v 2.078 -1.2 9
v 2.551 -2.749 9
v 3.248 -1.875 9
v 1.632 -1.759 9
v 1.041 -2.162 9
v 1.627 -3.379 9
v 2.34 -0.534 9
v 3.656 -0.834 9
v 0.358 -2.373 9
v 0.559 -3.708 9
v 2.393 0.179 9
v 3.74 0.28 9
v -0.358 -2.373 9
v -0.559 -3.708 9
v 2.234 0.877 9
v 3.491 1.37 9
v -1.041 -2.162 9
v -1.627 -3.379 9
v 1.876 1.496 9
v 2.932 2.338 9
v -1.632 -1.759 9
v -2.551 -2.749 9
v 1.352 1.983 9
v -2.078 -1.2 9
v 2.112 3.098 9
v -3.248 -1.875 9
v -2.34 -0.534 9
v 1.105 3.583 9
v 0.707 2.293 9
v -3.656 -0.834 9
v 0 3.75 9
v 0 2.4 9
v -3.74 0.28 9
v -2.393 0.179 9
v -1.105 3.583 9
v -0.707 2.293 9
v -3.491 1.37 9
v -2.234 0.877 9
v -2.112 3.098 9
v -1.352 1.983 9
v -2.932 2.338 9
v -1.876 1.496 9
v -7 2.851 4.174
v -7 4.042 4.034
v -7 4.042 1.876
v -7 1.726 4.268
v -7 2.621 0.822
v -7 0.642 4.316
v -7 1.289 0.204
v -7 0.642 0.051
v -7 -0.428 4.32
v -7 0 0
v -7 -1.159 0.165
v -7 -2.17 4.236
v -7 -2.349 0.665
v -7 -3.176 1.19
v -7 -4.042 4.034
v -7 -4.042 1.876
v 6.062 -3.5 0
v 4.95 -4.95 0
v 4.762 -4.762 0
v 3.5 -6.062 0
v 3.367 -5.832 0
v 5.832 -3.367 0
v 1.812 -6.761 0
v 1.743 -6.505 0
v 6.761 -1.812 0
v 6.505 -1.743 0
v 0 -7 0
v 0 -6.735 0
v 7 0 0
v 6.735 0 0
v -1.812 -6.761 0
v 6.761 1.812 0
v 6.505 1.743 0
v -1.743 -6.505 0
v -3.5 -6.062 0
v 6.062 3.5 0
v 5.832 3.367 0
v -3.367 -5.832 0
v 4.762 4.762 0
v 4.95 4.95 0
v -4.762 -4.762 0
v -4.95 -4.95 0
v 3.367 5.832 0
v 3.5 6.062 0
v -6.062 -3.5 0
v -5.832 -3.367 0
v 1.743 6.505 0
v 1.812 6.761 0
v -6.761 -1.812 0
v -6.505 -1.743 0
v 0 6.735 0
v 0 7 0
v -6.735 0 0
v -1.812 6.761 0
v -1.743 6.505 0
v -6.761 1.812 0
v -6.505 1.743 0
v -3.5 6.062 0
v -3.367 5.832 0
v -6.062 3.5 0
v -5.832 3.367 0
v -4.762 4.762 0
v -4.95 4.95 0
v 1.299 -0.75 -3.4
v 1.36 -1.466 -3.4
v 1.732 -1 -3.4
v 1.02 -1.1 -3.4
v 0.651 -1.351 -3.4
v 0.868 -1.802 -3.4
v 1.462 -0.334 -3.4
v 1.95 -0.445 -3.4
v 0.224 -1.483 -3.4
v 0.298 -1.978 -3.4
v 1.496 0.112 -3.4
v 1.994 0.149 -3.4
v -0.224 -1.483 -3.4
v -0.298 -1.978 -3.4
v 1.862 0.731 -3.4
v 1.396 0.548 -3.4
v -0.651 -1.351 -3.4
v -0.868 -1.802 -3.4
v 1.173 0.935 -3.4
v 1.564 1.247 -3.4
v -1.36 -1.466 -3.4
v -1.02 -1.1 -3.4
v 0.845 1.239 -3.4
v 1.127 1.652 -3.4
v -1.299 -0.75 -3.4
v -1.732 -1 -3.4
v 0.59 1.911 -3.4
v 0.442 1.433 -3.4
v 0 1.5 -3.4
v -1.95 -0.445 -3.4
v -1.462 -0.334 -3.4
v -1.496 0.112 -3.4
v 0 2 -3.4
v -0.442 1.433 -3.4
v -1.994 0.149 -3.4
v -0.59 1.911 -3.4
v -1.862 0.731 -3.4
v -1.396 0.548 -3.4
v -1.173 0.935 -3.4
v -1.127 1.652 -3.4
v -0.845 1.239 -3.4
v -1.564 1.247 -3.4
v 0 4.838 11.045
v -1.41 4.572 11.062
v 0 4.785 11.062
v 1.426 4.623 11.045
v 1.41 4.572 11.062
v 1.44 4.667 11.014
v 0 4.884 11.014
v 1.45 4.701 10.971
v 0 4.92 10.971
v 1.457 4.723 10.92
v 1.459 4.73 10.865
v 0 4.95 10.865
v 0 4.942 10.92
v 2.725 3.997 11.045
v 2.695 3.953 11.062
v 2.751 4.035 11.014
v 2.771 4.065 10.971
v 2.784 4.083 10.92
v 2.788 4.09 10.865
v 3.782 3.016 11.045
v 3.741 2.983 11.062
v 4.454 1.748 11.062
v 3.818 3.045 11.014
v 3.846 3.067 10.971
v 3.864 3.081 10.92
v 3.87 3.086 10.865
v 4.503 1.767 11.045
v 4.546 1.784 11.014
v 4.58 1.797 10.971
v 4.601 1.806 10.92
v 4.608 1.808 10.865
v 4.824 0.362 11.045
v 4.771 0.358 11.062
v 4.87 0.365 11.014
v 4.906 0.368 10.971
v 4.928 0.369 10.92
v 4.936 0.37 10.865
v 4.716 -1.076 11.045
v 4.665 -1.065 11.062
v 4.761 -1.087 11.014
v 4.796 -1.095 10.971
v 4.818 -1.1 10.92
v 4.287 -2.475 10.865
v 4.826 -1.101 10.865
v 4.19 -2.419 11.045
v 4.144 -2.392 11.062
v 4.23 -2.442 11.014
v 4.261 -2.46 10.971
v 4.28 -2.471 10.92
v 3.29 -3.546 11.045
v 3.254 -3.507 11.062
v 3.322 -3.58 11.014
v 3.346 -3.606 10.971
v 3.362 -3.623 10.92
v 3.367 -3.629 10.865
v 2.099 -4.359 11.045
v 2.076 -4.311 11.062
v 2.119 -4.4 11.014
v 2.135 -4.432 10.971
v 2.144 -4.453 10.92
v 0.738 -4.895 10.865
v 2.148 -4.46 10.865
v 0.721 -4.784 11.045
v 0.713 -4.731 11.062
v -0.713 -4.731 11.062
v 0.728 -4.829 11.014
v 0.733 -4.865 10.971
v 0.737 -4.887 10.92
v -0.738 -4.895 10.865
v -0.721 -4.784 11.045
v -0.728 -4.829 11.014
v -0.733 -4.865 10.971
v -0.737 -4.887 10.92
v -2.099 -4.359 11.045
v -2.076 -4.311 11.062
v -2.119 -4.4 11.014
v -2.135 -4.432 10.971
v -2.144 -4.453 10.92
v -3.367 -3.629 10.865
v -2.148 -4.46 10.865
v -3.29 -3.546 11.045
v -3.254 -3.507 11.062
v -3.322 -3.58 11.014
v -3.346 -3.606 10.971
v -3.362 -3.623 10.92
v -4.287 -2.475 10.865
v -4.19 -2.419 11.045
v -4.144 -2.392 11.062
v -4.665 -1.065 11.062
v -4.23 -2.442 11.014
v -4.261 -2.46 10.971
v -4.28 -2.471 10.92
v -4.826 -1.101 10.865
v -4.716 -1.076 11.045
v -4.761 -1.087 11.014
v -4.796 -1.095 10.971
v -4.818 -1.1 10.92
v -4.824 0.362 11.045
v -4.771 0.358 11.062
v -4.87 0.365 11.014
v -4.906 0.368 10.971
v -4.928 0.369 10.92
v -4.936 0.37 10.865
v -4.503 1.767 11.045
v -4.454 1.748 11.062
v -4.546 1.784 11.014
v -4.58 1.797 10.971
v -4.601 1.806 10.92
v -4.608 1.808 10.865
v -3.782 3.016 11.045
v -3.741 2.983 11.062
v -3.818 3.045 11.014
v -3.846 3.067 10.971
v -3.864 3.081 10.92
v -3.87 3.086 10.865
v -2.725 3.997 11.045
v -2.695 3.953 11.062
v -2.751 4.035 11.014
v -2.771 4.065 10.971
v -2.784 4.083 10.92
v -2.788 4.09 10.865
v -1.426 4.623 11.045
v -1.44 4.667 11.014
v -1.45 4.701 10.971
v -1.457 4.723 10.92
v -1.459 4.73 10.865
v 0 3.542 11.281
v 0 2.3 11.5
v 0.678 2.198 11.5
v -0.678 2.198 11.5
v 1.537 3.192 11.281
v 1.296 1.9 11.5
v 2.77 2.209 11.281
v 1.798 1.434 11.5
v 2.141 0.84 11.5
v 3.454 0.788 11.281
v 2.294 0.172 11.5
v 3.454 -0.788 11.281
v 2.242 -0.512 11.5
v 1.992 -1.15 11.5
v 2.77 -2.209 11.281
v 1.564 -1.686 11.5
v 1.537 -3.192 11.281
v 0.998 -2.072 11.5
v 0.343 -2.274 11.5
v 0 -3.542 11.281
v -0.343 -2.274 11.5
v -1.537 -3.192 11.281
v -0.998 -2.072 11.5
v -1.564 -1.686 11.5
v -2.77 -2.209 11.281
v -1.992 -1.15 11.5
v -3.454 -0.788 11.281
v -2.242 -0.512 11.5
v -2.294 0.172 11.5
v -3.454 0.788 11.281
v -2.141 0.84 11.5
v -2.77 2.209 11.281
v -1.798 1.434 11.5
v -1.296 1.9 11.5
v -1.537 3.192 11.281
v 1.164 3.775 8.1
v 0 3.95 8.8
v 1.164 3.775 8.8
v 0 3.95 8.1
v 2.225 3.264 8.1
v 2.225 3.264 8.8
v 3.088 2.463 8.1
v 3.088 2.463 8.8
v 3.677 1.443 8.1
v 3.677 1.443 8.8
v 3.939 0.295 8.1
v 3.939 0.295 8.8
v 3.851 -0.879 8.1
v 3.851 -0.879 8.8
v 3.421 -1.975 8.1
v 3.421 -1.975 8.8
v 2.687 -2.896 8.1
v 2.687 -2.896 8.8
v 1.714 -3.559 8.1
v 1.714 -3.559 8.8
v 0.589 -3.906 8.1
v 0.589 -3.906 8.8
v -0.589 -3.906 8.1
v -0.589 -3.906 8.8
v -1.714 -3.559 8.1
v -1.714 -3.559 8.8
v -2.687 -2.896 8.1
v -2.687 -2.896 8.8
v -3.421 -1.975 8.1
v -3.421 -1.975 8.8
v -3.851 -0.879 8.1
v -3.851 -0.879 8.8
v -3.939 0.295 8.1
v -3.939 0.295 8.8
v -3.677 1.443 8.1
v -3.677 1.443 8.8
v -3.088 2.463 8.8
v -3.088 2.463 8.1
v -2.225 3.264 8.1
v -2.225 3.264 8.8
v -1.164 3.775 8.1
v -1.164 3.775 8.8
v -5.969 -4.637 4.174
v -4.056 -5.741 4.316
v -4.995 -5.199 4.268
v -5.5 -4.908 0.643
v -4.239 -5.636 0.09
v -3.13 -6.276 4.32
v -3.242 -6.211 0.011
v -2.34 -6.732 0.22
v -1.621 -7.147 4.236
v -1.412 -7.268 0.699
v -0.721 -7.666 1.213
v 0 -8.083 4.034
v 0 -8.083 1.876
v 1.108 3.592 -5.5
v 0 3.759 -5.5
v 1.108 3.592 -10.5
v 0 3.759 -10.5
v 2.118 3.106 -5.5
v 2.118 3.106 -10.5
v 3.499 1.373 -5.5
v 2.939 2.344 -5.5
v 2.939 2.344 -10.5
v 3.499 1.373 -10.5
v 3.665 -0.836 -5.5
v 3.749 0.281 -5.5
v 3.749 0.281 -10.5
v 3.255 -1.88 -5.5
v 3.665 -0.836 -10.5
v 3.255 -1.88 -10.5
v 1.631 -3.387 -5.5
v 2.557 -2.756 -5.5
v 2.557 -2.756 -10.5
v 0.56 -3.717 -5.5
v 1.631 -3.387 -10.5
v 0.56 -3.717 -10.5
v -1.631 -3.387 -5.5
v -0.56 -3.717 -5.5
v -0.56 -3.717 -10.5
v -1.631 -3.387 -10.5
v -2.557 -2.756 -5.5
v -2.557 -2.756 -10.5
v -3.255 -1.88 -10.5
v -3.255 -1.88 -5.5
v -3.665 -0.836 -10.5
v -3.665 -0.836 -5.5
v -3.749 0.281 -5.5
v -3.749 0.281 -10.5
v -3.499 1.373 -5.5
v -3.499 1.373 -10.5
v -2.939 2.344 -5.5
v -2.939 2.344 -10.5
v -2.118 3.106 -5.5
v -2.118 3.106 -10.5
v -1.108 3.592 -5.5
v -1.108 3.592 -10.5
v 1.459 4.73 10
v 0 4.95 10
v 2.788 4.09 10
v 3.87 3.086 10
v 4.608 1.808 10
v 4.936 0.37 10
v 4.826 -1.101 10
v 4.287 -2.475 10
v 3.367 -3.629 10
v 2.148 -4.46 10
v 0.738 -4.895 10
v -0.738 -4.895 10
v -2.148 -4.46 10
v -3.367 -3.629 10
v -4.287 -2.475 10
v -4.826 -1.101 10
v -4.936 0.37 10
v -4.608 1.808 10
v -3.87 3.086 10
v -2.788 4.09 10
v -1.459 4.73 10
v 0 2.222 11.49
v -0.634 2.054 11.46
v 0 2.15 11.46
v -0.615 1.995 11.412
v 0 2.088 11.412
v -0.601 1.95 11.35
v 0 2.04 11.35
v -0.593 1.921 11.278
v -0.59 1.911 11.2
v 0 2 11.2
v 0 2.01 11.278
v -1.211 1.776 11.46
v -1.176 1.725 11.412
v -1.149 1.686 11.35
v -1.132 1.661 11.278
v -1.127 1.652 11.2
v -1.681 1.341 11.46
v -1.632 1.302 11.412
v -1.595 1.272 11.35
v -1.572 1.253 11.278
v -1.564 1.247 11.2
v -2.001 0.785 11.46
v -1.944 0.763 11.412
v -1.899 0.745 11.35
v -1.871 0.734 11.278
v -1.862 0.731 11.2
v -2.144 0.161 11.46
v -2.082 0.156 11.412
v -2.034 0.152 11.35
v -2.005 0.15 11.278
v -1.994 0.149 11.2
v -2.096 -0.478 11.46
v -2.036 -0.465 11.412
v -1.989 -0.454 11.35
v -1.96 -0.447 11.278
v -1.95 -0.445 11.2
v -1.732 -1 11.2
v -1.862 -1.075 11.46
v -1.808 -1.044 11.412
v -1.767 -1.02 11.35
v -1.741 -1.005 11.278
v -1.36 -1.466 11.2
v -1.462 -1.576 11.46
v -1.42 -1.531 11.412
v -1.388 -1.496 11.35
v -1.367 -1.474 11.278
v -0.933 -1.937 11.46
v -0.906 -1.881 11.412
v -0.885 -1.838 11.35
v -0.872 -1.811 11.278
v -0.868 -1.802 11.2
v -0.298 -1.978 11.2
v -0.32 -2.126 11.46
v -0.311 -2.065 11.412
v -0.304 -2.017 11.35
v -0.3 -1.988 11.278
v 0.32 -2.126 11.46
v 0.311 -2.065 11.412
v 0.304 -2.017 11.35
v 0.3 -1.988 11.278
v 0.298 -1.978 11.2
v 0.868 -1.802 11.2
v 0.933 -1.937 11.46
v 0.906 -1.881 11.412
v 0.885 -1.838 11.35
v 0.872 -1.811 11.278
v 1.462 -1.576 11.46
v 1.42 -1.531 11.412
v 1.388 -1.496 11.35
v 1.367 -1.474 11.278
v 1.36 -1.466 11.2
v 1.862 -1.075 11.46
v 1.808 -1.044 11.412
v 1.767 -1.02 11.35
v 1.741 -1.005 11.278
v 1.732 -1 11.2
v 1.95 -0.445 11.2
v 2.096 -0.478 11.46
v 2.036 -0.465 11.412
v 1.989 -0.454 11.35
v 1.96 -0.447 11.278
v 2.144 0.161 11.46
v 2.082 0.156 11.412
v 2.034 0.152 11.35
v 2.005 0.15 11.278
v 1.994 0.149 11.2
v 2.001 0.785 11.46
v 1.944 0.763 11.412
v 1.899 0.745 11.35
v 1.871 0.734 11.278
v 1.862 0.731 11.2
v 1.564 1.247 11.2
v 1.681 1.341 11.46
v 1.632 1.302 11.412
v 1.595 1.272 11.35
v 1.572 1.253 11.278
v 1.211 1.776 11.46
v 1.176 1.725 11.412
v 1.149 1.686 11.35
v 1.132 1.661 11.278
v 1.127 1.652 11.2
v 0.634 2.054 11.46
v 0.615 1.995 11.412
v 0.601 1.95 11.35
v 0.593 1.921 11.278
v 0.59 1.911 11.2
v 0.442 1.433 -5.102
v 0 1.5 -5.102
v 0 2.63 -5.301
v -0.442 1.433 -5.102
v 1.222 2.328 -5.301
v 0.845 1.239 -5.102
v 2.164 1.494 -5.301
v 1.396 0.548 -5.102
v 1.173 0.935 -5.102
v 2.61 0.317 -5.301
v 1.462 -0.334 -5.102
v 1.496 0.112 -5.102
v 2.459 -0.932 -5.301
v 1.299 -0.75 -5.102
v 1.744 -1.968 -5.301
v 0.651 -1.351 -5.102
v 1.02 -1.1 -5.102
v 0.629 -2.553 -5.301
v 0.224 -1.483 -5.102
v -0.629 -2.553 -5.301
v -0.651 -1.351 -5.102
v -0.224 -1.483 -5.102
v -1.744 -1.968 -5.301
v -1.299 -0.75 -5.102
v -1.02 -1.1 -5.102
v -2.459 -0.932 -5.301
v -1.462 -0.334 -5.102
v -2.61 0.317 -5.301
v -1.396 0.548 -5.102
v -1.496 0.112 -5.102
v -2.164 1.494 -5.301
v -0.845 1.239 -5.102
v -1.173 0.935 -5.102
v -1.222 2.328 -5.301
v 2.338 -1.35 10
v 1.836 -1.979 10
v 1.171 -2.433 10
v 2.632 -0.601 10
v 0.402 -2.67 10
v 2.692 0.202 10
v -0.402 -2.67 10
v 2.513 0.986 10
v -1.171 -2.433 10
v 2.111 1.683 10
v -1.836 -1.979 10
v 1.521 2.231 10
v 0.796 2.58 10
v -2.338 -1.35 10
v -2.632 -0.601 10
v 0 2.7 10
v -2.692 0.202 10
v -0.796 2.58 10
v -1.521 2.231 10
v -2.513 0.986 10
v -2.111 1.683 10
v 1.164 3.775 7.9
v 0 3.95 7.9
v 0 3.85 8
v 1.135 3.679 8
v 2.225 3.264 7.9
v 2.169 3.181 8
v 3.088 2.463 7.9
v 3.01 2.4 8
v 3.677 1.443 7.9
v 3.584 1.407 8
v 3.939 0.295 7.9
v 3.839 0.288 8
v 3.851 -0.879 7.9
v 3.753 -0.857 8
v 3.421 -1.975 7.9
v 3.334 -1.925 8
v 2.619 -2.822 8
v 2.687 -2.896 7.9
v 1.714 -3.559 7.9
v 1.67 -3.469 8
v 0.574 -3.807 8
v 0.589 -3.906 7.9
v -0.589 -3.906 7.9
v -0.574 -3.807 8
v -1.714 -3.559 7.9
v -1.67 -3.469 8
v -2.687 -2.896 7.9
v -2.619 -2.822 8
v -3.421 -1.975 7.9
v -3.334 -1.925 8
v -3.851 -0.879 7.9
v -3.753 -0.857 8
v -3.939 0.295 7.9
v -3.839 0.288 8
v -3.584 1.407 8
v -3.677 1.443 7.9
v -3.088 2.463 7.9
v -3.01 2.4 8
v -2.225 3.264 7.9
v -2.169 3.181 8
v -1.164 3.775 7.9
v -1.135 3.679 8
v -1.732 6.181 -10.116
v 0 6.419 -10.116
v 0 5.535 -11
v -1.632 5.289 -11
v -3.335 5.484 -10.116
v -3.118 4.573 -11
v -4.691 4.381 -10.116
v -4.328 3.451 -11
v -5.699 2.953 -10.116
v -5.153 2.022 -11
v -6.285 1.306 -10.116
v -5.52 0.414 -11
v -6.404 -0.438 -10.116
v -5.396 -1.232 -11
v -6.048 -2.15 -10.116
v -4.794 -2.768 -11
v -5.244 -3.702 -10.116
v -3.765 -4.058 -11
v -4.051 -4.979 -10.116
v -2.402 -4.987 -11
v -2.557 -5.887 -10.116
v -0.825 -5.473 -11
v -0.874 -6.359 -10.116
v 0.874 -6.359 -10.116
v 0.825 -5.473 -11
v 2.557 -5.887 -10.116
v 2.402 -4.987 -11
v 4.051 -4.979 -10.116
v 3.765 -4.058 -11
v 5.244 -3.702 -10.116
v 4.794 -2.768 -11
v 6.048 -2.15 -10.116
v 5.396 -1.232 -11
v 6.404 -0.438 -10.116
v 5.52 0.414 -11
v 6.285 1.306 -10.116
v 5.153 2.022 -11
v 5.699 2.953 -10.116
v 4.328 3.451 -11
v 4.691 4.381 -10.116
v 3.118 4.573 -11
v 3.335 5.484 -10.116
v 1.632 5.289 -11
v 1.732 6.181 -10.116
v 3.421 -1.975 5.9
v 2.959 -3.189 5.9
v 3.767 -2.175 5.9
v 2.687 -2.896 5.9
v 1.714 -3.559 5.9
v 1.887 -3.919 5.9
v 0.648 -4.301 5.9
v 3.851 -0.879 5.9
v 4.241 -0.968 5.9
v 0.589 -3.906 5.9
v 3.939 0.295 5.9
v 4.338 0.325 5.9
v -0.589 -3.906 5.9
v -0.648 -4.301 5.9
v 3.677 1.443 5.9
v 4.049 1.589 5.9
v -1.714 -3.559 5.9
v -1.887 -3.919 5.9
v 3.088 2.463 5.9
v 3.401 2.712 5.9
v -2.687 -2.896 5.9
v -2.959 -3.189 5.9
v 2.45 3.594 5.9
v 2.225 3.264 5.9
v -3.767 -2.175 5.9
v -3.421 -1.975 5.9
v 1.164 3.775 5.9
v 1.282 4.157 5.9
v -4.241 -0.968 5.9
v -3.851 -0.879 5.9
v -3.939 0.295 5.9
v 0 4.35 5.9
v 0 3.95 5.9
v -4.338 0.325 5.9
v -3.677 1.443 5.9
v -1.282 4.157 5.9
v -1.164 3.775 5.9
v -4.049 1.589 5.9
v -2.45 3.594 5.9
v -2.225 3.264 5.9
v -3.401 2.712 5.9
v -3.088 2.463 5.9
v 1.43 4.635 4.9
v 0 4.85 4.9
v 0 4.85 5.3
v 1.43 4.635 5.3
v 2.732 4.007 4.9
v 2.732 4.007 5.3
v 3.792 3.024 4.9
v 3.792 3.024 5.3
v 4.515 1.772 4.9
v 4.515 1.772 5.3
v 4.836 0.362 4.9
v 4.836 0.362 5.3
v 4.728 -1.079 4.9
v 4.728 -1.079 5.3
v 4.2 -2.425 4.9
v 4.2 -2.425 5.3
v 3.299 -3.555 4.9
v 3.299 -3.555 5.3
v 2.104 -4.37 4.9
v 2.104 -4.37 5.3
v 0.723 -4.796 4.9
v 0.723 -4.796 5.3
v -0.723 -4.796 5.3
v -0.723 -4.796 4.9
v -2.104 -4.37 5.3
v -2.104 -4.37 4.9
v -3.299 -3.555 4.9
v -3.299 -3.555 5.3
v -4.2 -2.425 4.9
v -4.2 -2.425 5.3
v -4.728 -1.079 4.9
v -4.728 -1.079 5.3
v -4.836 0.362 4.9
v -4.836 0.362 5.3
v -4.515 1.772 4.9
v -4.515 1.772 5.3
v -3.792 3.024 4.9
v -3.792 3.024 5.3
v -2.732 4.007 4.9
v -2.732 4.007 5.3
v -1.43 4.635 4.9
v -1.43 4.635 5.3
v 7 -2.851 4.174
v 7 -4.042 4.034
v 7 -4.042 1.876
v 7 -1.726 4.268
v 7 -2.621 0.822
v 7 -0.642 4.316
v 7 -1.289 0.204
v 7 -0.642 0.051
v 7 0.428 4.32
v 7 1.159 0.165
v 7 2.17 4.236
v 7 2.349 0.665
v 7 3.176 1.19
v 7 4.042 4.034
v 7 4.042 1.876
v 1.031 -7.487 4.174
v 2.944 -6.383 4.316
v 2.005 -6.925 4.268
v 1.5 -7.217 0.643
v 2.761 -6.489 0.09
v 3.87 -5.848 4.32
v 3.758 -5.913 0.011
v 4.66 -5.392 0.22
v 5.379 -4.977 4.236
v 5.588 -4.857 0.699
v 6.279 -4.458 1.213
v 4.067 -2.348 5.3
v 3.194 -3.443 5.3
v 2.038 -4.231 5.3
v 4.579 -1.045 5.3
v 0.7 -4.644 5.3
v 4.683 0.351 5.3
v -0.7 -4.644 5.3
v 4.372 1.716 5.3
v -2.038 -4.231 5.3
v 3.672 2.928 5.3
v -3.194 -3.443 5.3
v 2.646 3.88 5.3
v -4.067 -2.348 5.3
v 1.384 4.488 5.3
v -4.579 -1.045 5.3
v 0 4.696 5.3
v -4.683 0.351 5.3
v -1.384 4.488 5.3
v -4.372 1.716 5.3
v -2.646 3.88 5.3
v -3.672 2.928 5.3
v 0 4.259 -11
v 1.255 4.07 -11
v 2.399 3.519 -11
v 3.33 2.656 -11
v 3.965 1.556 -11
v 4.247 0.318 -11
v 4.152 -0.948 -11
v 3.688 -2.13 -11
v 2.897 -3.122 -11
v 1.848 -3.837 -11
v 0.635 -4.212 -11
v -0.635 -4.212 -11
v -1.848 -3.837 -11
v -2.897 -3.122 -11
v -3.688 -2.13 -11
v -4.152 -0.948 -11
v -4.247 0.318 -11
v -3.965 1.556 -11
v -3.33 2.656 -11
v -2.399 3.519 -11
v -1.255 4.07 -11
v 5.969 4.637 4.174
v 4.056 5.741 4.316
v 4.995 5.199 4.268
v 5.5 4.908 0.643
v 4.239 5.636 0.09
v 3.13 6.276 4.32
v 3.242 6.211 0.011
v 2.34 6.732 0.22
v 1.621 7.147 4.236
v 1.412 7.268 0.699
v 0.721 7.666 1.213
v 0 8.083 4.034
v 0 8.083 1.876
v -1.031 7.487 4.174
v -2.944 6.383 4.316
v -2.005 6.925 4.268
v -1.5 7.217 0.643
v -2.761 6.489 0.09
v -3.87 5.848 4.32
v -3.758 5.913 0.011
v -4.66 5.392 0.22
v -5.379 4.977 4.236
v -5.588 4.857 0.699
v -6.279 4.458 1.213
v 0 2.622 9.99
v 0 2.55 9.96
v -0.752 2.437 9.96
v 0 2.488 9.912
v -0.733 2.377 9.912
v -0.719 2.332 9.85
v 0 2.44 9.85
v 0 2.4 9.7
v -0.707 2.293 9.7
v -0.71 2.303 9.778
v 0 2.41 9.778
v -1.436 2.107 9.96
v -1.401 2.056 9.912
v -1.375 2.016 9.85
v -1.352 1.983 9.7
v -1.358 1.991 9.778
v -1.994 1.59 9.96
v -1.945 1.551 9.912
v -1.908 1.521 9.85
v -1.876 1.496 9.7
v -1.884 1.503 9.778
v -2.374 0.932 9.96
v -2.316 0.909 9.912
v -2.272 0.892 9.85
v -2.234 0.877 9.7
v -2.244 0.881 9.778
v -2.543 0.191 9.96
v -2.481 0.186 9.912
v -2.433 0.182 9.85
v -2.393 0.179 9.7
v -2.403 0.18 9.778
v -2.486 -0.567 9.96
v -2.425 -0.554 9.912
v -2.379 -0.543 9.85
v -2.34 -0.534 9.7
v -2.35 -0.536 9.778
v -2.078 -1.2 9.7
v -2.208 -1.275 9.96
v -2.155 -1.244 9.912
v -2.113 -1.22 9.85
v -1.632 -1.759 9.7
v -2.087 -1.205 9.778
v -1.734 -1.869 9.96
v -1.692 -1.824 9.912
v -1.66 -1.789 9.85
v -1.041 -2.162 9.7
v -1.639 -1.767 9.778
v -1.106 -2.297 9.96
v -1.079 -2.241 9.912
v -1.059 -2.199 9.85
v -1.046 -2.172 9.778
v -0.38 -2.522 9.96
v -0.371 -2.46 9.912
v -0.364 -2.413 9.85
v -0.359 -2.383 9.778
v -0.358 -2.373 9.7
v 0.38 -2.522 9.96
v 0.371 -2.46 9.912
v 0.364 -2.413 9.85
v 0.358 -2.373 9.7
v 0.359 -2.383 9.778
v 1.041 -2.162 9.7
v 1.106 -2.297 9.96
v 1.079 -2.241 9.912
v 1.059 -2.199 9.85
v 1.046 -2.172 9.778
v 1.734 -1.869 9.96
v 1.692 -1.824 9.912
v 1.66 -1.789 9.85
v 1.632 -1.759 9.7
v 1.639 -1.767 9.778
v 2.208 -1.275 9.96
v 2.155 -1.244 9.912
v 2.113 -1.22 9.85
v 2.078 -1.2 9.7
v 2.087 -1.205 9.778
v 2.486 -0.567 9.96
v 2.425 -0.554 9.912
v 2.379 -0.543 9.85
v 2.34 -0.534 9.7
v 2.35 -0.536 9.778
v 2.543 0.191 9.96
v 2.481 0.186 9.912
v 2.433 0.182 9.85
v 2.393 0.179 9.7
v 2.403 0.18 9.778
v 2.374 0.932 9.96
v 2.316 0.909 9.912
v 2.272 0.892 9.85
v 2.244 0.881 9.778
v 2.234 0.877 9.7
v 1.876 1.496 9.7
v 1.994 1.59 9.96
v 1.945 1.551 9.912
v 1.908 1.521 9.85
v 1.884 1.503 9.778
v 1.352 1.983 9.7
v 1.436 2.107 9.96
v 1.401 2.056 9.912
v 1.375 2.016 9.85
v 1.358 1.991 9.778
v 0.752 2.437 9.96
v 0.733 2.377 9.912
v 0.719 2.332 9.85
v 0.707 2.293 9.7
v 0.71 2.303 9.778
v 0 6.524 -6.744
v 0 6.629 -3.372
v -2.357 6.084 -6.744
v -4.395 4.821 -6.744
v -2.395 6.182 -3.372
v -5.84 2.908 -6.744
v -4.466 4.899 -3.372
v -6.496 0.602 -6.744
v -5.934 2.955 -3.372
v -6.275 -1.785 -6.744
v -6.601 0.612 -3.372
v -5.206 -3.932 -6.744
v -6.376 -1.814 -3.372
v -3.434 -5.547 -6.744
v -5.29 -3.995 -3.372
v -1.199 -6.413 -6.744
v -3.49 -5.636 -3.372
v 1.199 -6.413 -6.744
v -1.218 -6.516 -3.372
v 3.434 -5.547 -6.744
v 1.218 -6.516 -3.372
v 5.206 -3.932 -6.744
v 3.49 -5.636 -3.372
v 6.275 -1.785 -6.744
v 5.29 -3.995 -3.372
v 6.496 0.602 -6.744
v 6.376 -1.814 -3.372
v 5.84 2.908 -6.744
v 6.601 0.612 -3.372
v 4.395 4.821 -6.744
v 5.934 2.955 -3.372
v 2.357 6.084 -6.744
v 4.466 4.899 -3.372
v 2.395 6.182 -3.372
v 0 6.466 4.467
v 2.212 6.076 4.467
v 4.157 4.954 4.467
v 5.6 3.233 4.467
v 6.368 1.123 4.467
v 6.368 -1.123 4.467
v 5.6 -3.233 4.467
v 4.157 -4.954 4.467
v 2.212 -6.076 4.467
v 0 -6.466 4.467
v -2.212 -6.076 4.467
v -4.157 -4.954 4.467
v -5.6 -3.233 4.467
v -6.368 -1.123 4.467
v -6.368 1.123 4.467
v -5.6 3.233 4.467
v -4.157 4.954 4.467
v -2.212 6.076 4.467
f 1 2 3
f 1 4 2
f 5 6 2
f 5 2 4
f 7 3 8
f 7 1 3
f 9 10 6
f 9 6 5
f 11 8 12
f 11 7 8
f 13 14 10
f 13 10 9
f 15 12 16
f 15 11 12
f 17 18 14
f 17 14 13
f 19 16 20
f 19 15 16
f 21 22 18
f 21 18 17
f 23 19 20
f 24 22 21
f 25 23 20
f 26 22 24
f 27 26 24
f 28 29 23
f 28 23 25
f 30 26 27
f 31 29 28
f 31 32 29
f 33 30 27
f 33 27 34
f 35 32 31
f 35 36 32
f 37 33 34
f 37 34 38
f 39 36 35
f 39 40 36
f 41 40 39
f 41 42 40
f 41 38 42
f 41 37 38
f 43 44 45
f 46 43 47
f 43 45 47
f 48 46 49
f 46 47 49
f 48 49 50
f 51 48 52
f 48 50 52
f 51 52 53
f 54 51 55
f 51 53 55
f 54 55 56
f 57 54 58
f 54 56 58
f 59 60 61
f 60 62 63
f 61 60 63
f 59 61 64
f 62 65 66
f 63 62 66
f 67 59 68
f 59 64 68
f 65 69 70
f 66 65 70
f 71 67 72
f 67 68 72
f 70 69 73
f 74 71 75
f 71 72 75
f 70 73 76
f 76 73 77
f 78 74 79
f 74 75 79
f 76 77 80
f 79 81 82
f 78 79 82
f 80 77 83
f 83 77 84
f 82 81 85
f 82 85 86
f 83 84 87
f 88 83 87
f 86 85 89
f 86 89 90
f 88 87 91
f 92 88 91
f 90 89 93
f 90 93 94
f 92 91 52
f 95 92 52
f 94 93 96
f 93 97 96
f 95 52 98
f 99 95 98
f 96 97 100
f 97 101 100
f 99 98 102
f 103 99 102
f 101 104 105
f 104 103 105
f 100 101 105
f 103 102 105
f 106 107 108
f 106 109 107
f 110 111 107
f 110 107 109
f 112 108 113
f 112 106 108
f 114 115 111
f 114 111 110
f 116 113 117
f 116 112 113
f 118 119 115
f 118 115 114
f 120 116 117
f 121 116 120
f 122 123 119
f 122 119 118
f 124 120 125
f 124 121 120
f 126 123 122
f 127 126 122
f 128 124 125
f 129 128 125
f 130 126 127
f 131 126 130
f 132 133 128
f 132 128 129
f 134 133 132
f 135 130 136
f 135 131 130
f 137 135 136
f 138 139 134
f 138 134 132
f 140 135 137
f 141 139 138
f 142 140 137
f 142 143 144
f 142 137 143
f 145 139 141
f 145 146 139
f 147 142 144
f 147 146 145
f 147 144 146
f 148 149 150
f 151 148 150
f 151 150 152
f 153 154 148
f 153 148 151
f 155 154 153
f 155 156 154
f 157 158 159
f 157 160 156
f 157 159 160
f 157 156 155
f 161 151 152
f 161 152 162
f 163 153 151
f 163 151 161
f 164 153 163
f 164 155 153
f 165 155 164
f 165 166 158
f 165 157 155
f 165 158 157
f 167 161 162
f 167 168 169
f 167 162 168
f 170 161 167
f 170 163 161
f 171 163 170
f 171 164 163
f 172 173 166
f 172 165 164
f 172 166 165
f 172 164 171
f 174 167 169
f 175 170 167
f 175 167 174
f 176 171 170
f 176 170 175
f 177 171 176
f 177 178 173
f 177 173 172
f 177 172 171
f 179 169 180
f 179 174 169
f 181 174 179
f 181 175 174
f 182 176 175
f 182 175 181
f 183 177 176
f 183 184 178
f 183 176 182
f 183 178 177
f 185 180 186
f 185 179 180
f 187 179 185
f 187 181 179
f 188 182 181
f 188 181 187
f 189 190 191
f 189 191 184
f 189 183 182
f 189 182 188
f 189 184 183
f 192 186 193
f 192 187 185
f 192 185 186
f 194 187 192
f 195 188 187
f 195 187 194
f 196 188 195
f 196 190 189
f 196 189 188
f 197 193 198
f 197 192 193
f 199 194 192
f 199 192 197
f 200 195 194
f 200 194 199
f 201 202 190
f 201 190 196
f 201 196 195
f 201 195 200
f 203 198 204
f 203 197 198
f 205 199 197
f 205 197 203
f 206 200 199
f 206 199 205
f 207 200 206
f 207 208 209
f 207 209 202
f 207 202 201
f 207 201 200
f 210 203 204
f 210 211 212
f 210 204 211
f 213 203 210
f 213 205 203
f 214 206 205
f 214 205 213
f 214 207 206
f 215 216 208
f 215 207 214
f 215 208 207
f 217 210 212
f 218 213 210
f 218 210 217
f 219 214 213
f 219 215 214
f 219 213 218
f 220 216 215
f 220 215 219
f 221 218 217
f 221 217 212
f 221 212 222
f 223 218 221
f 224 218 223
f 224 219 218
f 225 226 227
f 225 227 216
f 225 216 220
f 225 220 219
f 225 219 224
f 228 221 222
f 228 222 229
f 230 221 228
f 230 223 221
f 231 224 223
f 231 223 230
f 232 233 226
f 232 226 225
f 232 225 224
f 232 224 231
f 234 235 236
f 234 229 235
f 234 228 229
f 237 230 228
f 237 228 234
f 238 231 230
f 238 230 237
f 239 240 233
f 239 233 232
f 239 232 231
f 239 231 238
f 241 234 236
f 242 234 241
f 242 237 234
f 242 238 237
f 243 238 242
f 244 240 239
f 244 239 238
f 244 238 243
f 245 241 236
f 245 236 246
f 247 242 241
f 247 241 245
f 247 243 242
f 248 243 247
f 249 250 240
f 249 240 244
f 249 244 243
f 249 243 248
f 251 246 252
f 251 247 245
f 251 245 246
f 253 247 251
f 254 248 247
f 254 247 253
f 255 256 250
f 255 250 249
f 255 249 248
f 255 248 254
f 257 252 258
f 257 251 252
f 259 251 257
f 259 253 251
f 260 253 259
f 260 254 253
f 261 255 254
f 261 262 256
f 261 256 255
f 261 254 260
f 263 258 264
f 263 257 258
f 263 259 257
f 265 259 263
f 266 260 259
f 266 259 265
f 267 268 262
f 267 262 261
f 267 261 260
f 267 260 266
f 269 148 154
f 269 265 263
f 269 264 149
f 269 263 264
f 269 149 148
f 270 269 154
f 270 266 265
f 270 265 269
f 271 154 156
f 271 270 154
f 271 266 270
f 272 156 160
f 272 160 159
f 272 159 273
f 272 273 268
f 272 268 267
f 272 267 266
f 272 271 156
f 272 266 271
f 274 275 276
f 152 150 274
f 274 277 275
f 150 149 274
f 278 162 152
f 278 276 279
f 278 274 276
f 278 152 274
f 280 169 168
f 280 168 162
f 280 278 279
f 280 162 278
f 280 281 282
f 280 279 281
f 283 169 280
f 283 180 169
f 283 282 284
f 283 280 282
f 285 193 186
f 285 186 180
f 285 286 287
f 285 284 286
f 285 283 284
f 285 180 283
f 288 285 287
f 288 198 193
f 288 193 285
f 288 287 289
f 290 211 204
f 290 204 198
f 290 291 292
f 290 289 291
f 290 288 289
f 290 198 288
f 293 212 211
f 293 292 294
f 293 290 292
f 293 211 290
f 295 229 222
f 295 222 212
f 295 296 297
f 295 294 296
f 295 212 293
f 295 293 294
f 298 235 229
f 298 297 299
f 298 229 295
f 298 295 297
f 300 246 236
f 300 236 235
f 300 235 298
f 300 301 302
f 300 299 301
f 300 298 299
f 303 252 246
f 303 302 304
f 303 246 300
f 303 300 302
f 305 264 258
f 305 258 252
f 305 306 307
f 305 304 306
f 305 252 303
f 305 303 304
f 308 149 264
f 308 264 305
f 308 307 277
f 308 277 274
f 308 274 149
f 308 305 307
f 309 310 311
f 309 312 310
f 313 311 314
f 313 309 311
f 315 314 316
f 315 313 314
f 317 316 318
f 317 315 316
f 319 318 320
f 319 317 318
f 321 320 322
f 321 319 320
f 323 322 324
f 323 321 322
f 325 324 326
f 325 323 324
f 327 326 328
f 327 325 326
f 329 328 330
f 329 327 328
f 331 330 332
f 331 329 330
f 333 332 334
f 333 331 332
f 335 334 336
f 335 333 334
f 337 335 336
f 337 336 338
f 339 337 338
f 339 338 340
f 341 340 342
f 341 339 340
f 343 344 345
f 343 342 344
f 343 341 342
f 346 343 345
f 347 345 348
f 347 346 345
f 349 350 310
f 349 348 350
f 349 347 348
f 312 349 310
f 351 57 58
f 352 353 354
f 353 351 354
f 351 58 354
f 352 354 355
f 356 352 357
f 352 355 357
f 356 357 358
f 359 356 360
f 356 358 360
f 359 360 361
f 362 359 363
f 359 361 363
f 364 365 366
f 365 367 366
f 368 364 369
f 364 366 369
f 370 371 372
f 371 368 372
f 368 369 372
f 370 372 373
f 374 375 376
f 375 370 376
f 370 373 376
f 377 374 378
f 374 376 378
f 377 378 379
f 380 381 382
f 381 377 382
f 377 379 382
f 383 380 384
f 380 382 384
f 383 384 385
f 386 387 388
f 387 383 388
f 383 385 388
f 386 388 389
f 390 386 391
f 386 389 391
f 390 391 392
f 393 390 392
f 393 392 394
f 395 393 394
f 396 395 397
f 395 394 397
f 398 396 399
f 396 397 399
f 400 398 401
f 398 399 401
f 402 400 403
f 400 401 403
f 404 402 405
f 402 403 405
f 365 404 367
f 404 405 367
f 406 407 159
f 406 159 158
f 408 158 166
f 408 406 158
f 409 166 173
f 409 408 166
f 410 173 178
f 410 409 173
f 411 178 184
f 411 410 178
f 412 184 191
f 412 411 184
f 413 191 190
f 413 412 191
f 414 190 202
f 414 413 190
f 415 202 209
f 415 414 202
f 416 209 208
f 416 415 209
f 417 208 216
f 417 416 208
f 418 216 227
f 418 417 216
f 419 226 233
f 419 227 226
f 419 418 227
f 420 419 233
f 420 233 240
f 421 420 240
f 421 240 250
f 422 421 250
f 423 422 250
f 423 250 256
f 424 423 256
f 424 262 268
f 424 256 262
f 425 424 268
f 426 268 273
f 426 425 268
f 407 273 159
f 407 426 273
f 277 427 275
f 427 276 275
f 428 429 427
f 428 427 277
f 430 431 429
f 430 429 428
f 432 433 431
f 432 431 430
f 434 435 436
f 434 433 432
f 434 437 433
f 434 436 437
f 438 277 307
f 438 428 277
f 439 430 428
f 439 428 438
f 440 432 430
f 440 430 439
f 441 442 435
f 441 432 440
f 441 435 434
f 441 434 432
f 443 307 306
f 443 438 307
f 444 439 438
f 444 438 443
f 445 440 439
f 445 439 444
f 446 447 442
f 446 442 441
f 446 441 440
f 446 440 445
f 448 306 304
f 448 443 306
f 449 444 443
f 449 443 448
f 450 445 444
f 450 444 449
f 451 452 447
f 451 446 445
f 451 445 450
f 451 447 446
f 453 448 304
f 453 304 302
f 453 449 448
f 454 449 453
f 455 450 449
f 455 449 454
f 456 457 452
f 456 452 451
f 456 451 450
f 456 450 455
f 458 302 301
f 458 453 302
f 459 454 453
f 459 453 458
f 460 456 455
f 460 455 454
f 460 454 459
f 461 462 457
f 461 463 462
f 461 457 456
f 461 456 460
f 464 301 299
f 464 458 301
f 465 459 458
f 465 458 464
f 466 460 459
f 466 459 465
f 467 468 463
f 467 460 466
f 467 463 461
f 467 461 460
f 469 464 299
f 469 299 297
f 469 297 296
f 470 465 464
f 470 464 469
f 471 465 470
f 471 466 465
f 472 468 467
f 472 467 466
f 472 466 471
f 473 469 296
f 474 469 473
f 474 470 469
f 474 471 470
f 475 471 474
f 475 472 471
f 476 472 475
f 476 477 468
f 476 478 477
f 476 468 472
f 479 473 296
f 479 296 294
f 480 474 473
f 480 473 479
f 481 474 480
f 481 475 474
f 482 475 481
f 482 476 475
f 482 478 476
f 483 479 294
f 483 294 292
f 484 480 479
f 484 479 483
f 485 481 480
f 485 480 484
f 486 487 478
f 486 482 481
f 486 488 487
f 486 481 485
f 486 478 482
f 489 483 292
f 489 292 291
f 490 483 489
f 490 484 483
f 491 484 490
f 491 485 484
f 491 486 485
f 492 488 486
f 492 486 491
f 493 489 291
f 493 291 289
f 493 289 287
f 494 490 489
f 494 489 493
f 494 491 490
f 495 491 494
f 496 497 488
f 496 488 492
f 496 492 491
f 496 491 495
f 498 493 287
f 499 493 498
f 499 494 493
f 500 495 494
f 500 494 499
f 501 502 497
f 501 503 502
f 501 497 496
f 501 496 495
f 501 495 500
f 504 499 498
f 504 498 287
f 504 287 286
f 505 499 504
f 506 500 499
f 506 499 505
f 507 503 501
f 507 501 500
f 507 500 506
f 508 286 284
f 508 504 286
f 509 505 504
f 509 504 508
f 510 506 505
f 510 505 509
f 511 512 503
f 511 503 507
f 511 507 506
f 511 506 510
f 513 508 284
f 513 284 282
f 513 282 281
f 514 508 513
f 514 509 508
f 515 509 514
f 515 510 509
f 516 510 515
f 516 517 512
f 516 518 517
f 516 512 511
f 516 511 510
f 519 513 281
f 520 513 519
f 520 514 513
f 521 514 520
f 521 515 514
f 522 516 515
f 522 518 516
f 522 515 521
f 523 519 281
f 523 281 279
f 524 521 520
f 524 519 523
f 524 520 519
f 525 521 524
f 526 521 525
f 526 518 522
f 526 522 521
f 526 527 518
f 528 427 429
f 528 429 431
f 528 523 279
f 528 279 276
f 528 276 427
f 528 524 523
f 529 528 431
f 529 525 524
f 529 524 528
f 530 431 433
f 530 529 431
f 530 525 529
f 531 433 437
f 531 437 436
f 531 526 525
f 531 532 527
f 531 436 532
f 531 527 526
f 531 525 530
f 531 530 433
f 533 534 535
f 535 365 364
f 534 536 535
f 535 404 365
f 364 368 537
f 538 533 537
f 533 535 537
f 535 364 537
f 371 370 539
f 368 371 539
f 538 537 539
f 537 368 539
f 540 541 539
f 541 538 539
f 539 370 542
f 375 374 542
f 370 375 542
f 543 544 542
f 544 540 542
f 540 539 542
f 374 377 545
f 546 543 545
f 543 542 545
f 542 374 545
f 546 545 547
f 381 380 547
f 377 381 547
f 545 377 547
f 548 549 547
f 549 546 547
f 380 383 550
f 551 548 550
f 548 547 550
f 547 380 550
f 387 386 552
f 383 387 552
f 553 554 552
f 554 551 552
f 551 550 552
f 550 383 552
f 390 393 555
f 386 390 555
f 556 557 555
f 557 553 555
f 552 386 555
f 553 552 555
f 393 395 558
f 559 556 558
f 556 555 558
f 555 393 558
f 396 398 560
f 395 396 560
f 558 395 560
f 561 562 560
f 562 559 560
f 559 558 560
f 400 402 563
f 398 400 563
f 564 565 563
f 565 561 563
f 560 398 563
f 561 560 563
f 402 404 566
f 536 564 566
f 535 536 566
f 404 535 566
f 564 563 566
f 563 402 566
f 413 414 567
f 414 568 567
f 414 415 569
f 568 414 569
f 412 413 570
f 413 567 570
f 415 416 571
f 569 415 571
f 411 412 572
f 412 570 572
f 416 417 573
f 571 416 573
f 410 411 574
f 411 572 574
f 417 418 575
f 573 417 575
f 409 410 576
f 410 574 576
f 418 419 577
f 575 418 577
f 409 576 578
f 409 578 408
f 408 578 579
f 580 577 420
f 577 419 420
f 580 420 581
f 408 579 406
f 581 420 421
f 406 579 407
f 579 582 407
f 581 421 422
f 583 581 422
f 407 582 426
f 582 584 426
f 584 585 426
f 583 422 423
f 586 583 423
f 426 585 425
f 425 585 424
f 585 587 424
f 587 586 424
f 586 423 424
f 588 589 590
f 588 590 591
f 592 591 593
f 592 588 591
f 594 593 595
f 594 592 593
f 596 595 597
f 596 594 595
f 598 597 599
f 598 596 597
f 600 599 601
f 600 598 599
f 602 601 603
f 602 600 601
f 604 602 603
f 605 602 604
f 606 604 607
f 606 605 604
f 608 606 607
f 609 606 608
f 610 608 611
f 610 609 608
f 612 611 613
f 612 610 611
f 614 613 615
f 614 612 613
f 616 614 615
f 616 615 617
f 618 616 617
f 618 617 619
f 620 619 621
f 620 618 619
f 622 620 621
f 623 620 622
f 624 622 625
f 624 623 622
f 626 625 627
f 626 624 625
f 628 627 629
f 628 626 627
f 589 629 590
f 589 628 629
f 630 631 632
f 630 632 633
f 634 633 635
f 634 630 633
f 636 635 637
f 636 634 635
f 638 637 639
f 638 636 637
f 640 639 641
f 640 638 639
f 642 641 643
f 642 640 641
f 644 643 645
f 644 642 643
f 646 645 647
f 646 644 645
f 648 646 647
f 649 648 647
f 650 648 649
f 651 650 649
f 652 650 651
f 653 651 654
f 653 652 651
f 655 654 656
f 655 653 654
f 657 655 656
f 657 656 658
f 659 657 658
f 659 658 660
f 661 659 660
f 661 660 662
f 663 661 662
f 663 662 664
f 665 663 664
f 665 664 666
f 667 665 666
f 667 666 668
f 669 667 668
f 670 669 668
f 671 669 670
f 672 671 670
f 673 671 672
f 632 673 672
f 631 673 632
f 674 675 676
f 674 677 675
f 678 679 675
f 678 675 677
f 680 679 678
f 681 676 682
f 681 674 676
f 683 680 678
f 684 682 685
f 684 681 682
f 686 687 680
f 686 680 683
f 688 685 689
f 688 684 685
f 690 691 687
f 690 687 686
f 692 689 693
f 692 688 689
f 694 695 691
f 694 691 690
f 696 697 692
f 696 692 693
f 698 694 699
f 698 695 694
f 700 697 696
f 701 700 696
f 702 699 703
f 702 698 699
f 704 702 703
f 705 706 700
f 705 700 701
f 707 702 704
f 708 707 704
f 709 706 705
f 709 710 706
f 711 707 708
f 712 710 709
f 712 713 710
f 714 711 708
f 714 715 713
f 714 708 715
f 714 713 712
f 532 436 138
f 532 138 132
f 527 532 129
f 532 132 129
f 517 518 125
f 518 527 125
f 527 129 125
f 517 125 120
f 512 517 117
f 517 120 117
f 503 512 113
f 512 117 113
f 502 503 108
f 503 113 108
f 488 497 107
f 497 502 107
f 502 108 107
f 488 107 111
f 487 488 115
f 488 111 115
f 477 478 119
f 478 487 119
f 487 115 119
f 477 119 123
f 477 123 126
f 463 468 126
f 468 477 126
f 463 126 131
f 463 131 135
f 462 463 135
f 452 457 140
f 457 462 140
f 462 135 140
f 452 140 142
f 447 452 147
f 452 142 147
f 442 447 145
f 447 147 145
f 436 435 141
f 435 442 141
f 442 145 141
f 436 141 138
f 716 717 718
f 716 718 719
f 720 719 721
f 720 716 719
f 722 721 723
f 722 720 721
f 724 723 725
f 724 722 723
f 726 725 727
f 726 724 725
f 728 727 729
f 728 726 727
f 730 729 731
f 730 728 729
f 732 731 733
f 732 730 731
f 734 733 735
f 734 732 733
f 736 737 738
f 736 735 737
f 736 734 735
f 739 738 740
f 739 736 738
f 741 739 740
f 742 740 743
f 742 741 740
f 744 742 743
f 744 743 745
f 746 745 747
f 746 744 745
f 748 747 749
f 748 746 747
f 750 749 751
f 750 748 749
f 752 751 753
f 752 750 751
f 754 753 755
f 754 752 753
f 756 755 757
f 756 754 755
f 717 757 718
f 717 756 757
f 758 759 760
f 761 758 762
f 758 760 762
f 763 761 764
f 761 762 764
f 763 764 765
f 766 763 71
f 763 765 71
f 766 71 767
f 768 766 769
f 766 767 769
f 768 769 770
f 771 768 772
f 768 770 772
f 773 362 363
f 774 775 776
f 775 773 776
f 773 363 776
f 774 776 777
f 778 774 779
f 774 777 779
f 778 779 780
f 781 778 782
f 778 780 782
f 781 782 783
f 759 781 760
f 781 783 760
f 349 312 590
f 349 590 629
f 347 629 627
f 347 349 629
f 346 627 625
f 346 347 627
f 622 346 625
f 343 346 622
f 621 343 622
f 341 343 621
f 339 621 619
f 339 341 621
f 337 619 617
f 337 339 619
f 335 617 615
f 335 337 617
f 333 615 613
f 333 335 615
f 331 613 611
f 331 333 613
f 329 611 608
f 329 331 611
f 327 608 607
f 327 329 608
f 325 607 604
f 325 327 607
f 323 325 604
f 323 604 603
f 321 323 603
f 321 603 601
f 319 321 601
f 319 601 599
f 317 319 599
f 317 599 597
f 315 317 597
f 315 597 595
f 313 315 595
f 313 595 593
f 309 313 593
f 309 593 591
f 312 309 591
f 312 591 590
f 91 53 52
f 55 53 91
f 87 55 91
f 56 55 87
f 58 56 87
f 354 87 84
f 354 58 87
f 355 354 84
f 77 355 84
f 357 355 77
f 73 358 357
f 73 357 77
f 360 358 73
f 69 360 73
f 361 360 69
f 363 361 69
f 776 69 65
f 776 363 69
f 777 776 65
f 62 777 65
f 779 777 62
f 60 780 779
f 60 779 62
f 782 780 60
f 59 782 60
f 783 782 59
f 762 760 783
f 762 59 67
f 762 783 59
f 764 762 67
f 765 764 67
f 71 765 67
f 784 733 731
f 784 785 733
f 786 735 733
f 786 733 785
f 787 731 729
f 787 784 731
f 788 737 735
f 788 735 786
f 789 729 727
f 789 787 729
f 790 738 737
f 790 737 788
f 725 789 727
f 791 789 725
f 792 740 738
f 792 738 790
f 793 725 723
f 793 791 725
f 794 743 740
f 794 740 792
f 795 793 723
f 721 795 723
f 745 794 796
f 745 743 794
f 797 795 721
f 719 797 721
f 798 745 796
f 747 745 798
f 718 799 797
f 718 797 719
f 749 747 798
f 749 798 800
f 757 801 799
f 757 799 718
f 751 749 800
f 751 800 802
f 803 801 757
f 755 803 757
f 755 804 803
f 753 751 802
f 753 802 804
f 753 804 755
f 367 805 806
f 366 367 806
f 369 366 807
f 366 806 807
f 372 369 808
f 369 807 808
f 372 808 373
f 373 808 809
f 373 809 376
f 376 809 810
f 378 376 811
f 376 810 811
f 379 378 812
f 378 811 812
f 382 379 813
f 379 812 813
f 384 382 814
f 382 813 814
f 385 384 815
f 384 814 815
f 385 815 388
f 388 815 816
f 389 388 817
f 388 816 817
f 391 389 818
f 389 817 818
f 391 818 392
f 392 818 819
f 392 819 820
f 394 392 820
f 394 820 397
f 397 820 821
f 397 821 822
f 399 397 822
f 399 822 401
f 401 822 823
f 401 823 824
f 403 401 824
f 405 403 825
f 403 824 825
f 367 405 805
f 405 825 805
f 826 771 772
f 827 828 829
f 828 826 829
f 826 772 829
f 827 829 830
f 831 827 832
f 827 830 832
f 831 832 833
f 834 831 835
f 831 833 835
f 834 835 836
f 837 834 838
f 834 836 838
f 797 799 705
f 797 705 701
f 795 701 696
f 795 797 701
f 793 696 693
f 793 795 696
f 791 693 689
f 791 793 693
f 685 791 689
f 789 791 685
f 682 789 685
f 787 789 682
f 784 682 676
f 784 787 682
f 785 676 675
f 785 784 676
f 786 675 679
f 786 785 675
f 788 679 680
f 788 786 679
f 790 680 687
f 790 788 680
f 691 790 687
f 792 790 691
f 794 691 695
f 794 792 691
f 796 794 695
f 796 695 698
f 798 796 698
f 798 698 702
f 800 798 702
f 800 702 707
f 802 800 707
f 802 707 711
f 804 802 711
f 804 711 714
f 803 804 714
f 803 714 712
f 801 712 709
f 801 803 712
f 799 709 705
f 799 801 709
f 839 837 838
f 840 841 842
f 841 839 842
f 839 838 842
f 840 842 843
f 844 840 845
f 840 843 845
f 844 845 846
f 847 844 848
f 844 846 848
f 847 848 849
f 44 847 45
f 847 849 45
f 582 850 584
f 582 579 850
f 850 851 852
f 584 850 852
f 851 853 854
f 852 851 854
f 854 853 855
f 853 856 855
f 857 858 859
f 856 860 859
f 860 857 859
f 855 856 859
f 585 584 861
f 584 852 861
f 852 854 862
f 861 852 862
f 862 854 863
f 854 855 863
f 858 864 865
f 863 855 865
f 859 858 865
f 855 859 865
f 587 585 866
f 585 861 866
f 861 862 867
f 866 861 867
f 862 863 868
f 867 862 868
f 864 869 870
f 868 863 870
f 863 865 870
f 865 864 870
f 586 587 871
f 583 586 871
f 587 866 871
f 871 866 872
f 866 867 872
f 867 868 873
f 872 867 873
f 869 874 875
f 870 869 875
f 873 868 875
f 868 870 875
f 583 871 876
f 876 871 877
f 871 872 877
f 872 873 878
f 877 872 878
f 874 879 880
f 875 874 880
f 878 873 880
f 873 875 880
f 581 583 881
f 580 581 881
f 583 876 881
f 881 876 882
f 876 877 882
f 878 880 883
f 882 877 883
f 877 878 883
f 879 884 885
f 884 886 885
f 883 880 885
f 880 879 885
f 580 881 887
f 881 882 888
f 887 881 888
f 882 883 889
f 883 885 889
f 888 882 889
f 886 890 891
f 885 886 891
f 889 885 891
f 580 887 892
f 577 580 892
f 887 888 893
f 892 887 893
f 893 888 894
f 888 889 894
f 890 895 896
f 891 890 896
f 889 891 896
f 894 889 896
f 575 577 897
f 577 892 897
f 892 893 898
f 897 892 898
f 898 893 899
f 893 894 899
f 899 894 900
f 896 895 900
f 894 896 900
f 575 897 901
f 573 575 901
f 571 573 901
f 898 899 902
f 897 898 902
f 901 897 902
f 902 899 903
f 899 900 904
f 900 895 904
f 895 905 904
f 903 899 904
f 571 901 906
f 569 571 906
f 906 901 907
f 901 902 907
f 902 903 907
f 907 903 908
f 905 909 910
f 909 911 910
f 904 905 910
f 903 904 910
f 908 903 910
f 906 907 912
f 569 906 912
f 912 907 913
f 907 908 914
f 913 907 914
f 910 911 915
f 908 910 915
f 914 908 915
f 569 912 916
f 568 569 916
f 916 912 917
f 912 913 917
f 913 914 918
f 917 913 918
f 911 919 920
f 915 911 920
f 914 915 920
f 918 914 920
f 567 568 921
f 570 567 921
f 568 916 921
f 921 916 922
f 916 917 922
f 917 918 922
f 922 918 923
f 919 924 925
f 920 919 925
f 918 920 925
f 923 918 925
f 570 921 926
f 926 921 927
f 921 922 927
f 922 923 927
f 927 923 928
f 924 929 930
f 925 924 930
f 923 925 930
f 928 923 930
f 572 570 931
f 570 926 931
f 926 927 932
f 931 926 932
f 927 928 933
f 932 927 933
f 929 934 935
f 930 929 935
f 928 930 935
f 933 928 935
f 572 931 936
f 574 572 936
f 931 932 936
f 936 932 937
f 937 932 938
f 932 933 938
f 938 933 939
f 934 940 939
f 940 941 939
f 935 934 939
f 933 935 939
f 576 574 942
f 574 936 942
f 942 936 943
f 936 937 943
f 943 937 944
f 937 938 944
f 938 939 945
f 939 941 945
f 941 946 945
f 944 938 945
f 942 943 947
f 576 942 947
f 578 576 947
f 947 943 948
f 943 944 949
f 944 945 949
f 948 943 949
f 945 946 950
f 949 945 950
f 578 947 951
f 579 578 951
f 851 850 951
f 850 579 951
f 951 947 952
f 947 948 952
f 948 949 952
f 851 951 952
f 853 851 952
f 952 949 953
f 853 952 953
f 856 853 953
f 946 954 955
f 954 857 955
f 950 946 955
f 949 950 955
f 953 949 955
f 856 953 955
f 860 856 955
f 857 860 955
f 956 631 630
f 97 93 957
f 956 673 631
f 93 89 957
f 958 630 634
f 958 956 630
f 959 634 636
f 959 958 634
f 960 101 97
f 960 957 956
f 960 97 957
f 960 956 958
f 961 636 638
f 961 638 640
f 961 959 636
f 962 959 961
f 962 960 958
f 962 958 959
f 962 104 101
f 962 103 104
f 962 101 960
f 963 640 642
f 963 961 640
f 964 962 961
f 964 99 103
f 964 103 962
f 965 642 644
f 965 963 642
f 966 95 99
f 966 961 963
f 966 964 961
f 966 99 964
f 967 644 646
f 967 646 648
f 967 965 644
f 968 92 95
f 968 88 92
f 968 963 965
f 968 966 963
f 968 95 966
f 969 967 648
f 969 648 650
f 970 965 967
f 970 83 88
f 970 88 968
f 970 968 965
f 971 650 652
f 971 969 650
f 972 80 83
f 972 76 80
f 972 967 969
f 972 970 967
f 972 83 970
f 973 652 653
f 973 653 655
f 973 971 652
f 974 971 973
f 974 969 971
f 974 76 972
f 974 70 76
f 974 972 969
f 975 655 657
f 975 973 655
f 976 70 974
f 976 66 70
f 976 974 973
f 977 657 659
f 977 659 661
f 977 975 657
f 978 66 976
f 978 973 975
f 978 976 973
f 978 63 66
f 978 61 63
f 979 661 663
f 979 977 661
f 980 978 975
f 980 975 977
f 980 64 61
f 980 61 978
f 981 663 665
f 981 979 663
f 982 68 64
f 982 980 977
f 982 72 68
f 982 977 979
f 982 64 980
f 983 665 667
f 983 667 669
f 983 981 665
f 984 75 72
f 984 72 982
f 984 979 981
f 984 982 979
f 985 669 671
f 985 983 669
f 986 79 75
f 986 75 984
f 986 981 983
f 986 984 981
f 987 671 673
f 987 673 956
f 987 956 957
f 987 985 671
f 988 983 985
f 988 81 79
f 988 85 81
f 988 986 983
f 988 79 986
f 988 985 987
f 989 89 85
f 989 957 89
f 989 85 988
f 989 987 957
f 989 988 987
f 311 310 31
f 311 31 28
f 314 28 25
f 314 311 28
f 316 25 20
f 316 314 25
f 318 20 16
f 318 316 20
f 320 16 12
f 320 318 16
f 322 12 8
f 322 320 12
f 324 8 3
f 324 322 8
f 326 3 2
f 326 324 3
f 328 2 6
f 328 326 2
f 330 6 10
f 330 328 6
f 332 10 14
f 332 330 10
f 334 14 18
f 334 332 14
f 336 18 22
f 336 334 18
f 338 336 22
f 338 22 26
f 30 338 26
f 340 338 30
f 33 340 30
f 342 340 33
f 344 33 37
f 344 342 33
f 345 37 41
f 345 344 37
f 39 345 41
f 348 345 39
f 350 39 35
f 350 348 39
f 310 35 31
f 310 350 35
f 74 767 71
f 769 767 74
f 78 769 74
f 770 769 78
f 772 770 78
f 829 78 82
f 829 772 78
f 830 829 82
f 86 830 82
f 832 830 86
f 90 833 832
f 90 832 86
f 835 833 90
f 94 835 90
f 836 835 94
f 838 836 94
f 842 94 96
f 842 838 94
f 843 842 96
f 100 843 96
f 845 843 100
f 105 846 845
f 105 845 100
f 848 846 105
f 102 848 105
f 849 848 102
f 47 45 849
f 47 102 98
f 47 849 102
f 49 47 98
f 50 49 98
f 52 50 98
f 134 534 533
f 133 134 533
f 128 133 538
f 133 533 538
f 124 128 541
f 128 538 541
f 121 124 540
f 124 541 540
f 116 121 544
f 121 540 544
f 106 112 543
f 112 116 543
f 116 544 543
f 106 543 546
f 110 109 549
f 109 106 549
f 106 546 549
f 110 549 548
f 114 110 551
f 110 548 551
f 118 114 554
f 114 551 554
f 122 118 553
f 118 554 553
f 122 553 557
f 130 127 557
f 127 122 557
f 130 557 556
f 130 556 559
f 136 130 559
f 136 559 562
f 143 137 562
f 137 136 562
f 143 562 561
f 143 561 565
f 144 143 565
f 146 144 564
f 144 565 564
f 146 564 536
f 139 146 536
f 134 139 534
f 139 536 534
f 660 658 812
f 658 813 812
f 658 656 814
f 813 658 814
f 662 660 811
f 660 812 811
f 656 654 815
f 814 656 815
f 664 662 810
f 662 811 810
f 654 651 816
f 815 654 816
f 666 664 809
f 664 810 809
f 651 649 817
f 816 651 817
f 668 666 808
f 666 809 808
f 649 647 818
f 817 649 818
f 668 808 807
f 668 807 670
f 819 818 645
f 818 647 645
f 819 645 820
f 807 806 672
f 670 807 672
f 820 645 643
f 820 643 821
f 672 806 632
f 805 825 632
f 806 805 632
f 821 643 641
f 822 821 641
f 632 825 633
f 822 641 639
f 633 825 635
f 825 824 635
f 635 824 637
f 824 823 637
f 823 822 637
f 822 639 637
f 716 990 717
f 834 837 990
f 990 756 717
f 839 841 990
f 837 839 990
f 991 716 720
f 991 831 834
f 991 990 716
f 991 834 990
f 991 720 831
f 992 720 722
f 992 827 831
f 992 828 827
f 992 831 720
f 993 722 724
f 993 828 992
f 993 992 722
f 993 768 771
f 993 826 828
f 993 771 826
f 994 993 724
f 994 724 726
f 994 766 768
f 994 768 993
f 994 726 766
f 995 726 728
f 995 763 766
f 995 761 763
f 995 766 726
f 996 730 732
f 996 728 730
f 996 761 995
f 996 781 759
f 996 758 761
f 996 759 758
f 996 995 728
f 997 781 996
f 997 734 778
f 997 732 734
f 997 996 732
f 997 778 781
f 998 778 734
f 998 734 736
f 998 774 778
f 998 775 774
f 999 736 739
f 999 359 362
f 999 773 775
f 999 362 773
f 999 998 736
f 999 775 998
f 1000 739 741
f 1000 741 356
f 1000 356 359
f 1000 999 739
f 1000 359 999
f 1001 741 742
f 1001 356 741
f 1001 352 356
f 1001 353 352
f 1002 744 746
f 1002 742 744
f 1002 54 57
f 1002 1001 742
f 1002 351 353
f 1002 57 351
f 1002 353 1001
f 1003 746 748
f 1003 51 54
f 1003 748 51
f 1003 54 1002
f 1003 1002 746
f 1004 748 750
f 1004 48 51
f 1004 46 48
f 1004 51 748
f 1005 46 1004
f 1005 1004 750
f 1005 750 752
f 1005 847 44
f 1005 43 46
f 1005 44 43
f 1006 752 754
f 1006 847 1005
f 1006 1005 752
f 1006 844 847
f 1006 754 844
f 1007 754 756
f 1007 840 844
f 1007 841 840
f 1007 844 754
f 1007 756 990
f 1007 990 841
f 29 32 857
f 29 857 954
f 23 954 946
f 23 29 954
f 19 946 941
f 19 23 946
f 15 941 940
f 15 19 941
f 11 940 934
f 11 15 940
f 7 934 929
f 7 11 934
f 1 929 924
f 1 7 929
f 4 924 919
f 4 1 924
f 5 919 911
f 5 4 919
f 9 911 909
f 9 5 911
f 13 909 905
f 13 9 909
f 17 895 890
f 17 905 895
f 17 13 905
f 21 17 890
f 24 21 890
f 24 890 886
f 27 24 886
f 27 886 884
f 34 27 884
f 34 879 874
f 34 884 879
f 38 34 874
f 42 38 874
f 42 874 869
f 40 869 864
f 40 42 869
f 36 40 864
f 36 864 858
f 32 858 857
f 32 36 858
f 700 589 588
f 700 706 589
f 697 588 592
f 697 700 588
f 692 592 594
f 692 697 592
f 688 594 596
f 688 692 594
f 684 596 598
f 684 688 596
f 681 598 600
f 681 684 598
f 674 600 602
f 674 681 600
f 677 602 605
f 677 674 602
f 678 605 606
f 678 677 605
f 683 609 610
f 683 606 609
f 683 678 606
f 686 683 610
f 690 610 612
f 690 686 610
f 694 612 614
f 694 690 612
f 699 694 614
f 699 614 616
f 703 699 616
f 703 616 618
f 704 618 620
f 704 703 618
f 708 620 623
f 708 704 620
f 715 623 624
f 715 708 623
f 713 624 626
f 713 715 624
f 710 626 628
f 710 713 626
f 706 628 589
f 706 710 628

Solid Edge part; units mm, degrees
sketch "Sketch1" plane through (0, 0, 0) normal (1, 0, 0) x (0, 1, 0)
  line L0 (0, 11.5) -> (2.3, 11.5)
  line L1 (2.3, 11.5) -> (4.7847, 11.0619)
  arc A0 (4.7847, 11.0619) -> (4.95, 10.8649) centre (4.75, 10.8649) cw
  line L2 (4.95, 10.8649) -> (4.95, 10)
  line L3 (4.95, 10) -> (2.7, 10)
  arc A1 (2.7, 10) -> (2.4, 9.7) centre (2.7, 9.7) ccw
  line L4 (2.4, 9.7) -> (2.4, 9)
  line L5 (2.4, 9) -> (3.75, 9)
  line L6 (3.75, 9) -> (3.95, 8.8)
  line L7 (3.95, 8.8) -> (3.95, 8.1)
  line L8 (3.95, 8.1) -> (3.85, 8)
  line L9 (3.85, 8) -> (3.95, 7.9)
  line L10 (3.95, 7.9) -> (3.95, 5.9)
  line L11 (3.95, 5.9) -> (8.4, 5.9)
  line L12 (8.4, 5.9) -> (8.4, 2.4249)
  line L13 (8.4, 2.4249) -> (7, 0)
  line L14 (7, 0) -> (0, 0)
  line L15 (0, 0) -> (0, 11.5)
revolve "RevolvedProtrusion1" add sketch "Sketch1" angle 360 about axis through (0, 0, 0) along (0, 0, 1)
sketch "Sketch2" plane through (0, 0, 0) normal (0, 0, 1) x (1, 0, 0)
  line L0 (-14, -14) -> (14, -14)
  line L1 (14, -14) -> (14, 14)
  line L2 (14, 14) -> (-14, 14)
  line L3 (-14, 14) -> (-14, -14)
  line L4 (-7, -4.0415) -> (0, -8.0829)
  line L5 (0, -8.0829) -> (7, -4.0415)
  line L6 (7, -4.0415) -> (7, 4.0415)
  line L7 (7, 4.0415) -> (0, 8.0829)
  line L8 (0, 8.0829) -> (-7, 4.0415)
  line L9 (-7, 4.0415) -> (-7, -4.0415)
extrude "Cutout1" cut sketch "Sketch2" along normal blind 6
sketch "Sketch3" plane through (0, 0, 0) normal (1, 0, 0) x (0, 1, 0)
  line L0 (4.35, 5.9) -> (4.6964, 5.3)
  line L1 (4.6964, 5.3) -> (4.85, 5.3)
  line L2 (4.85, 5.3) -> (4.85, 4.9)
  line L3 (4.85, 4.9) -> (14.85, 2.2205)
  line L4 (14.85, 2.2205) -> (14.85, 5.9)
  line L5 (14.85, 5.9) -> (4.35, 5.9)
revolve "RevolvedCutout1" cut sketch "Sketch3" angle 360 about axis through (0, 0, -50) along (0, 0, 1)
sketch "Sketch4" plane through (0, 0, 0) normal (1, 0, 0) x (0, 1, 0)
  line L0 (0, 0) -> (6.7346, 0)
  line L1 (6.7346, 0) -> (6.4188, -10.1164)
  line L2 (6.4188, -10.1164) -> (5.5352, -11)
  line L3 (5.5352, -11) -> (0, -11)
  line L4 (0, -11) -> (0, 0)
revolve "RevolvedProtrusion2" add sketch "Sketch4" angle 360 about axis through (0, 0, -11) along (0, 0, 1)
sketch "Sketch5" plane through (0, 0, 0) normal (1, 0, 0) x (0, 1, 0)
  line L0 (0, 11.5) -> (2.3, 11.5)
  arc A0 (2.3, 11.5) -> (2, 11.2) centre (2.3, 11.2) ccw
  line L1 (2, 11.2) -> (2, -3.4)
  line L2 (2, -3.4) -> (1.5, -3.4)
  line L3 (1.5, -3.4) -> (1.5, -5.1017)
  line L4 (1.5, -5.1017) -> (3.7591, -5.5)
  line L5 (3.7591, -5.5) -> (3.7591, -10.5)
  line L6 (3.7591, -10.5) -> (4.2591, -11)
  line L7 (4.2591, -11) -> (0, -11)
  line L8 (0, -11) -> (0, 11.5)
revolve "RevolvedCutout2" cut sketch "Sketch5" angle 360 about axis through (0, 0, -11) along (0, 0, 1)
properties part number "190644 QS-1/4-4"
